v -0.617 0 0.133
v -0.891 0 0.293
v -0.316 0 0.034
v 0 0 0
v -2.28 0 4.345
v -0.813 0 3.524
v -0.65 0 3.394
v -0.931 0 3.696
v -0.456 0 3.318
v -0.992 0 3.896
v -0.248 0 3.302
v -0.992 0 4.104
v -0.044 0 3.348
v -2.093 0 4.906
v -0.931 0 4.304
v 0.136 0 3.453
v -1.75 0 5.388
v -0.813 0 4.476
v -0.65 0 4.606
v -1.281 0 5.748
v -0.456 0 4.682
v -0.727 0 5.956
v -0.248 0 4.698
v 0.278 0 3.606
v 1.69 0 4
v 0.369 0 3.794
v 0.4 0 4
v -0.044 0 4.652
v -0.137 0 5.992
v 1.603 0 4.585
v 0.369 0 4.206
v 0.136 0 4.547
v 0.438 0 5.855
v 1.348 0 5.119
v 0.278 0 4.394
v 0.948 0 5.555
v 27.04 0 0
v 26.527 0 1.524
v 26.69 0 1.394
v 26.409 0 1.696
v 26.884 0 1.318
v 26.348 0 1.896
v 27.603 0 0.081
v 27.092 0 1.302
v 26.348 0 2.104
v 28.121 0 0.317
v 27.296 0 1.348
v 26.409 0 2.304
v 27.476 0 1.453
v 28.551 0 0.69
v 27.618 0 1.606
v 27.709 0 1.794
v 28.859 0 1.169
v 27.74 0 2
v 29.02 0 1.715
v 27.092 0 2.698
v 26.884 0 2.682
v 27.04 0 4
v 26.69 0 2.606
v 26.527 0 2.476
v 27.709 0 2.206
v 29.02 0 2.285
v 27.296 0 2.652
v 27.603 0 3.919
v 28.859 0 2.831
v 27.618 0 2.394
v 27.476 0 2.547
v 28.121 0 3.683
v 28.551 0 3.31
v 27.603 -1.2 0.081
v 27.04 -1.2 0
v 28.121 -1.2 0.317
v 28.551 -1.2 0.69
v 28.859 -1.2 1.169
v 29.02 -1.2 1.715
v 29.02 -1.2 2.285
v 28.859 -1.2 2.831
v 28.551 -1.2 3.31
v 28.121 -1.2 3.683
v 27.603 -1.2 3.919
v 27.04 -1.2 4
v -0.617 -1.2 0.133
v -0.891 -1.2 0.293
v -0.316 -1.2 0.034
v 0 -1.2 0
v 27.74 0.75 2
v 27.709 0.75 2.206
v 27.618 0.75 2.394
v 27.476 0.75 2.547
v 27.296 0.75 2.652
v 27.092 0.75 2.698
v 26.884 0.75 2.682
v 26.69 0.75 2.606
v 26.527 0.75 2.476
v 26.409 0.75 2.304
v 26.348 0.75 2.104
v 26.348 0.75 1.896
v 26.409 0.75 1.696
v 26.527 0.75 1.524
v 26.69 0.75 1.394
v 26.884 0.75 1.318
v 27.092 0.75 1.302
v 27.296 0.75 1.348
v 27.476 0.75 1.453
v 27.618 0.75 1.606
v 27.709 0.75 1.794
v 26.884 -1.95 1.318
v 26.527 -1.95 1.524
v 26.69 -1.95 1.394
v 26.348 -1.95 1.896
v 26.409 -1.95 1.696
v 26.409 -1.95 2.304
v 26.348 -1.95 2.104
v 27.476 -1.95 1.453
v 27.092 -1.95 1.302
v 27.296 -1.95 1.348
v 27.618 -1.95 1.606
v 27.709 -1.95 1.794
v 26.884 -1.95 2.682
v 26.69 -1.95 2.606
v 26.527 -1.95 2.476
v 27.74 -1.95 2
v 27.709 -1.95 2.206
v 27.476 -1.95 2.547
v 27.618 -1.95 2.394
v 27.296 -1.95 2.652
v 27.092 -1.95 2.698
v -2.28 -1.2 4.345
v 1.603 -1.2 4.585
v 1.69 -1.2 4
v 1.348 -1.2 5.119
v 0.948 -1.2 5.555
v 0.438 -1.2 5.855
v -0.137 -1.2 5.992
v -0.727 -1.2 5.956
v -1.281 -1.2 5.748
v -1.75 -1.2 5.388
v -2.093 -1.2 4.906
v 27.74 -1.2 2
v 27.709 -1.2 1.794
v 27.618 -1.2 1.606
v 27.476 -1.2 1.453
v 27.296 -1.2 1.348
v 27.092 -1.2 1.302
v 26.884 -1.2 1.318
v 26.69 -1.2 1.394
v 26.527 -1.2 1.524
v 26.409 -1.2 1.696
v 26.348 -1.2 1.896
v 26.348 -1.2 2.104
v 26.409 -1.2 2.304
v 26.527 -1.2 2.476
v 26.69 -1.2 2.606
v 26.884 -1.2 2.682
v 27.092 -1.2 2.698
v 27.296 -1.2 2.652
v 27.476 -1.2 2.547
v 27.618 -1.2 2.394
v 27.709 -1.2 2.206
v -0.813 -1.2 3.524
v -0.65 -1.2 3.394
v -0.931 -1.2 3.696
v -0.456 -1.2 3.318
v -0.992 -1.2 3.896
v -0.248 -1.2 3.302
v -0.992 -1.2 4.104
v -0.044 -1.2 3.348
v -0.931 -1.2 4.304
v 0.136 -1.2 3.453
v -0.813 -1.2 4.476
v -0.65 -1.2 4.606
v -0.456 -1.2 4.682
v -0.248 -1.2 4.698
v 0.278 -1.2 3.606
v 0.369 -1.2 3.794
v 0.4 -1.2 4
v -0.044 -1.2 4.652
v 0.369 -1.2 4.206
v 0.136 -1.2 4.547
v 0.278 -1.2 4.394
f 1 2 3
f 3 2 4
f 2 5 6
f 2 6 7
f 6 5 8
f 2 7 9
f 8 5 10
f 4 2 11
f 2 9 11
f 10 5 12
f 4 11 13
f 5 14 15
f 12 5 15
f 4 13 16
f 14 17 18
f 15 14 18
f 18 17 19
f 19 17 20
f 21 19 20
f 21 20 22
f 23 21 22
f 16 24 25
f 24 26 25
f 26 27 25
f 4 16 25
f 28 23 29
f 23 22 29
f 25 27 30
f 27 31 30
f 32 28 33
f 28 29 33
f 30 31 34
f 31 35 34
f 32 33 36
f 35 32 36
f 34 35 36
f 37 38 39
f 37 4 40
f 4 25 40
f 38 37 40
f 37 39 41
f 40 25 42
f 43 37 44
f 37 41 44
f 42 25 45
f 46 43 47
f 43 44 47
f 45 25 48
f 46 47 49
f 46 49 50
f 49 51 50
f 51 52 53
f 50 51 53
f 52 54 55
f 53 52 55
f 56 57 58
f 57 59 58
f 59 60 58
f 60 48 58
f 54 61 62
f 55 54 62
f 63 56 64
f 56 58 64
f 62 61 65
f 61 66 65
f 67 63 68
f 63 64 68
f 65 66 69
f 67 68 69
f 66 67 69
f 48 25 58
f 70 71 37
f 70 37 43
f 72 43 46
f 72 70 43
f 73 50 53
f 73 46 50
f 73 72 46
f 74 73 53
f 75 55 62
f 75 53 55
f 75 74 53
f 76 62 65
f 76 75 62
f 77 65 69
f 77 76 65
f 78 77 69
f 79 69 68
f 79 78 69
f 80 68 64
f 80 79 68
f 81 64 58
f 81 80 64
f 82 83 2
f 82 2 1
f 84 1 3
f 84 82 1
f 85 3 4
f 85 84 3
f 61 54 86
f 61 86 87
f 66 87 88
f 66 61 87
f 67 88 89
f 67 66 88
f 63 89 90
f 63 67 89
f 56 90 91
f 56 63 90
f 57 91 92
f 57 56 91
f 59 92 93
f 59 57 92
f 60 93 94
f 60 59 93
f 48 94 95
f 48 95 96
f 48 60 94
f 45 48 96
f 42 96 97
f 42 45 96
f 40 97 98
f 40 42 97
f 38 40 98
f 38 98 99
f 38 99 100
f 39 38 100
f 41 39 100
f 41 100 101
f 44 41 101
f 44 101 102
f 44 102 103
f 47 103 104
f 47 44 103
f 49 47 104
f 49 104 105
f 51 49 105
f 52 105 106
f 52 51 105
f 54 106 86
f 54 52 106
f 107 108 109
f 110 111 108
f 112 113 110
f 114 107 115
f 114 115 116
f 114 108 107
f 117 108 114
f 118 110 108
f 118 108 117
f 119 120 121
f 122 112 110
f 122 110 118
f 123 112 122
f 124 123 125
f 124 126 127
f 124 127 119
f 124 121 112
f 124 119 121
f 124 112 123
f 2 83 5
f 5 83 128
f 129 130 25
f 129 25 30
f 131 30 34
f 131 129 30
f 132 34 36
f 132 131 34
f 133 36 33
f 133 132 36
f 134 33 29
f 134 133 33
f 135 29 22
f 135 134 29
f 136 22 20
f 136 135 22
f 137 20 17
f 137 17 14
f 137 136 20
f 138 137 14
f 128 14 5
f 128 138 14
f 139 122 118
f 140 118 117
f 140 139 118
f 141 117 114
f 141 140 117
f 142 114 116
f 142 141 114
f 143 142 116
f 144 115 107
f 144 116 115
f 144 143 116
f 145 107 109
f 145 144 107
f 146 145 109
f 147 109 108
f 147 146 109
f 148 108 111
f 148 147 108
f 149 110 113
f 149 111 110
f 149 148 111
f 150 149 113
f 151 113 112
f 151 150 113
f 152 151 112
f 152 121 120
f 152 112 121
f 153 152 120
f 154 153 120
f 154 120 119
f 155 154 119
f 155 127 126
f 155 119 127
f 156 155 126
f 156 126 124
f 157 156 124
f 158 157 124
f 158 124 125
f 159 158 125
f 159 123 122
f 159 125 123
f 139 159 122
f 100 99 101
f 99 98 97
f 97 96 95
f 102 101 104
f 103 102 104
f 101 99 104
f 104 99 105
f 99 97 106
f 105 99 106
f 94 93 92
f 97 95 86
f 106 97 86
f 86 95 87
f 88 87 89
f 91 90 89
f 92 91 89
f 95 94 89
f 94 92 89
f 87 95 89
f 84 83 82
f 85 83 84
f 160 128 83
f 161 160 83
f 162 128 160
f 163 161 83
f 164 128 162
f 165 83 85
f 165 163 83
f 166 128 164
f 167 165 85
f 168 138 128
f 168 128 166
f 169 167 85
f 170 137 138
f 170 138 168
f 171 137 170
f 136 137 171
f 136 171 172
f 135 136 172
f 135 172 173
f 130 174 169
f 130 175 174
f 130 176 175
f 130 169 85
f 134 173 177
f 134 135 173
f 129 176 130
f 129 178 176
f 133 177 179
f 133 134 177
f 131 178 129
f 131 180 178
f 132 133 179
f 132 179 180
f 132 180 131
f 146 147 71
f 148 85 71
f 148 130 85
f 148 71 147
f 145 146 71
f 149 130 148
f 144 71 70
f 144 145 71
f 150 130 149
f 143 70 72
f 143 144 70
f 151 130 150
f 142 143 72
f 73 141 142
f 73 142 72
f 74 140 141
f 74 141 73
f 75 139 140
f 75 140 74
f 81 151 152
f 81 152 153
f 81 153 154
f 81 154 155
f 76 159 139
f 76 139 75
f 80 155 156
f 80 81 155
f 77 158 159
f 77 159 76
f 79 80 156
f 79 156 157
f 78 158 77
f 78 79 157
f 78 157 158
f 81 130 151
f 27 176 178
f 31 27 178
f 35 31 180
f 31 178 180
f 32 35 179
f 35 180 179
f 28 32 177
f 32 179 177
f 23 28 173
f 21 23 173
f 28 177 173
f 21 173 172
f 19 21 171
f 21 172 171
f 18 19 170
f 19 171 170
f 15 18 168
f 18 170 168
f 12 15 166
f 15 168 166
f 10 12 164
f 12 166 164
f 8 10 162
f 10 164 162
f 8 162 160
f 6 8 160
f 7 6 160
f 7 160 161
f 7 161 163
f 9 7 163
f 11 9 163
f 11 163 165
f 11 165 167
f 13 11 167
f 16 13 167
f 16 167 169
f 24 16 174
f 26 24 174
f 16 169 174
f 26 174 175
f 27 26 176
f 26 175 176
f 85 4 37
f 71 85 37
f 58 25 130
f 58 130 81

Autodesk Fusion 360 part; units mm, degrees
sketch "Sketch1" plane through (0, 0, 0) normal (0, 0, 1) x (1, 0, 0)
  line L0 (0, 0) -> (27.04, 0)
  line L1 (27.04, 0) -> (27.04, -1.2)
  line L2 (27.04, -1.2) -> (0, -1.2)
  line L3 (0, -1.2) -> (0, 0)
  dimension "d1" = 27.04
  dimension "d2" = 1.2
extrude "Extrude1" add sketch "Sketch1" along normal blind 4
sketch "Sketch2" plane through (0, -1.2, 0) normal (0, -1, 0) x (1, 0, 0)
  line L0 (0, 0) -> (27.04, 0)
  line L1 (27.04, 0) -> (27.04, 4)
  line L2 (27.04, 4) -> (0, 4)
  line L3 (0, 4) -> (0, 0)
  circle A0 centre (27.04, 2) radius 2
  dimension "d5" = 4
extrude "Extrude2" add sketch "Sketch2" against normal blind 1.2 contours L1 A0 picked at (27.2278, 2.6397)
sketch "Sketch3" plane through (0, -1.2, 0) normal (0, -1, 0) x (1, 0, 0)
  line L0 (0, 0) -> (27.04, 0)
  arc A0 (27.04, 0) -> (27.04, 4) centre (27.04, 2) ccw
  line L1 (27.04, 4) -> (0, 4)
  line L2 (0, 4) -> (0, 0)
  circle A1 centre (27.04, 2) radius 0.7
  dimension "d8" = 1.4
extrude "Extrude3" cut sketch "Sketch3" against normal blind 10 contours A1
sketch "Sketch4" plane through (0, -1.2, 0) normal (0, -1, 0) x (1, 0, 0)
  circle A0 centre (27.04, 2) radius 0.7
  line L0 (0, 0) -> (27.04, 0)
  arc A1 (27.04, 0) -> (27.04, 4) centre (27.04, 2) ccw
  line L1 (27.04, 4) -> (0, 4)
  line L2 (0, 4) -> (0, 0)
  line L3 (0, 0) -> (0, 1.5)
  circle A2 centre (0, 1.5) radius 1.5
  line L4 (-1.0715, 0) -> (5.393, 0) construction
  line L5 (-0.8097, 0) -> (6.2004, 0) construction
  line L6 (25.3, 0) -> (25.3, 4)
  line L7 (25.3, 0) -> (29.5592, 0)
  line L8 (25.3, 4) -> (30.5, 4)
  line L9 (29.04, 0) -> (29.04, 4)
  line L10 (29.04, 4) -> (1.69, 4)
  line L11 (29.04, 4) -> (1.69, 4)
  line L12 (29.04, 4) -> (1.69, 4)
  line L13 (1.69, 4) -> (-0.31, 4)
  circle A3 centre (-0.31, 4) radius 2
  line L14 (1.69, 4) -> (-2.28, 4)
  line L15 (-2.28, 4) -> (-2.28, 4.3451)
  line L16 (1.69, 4) -> (-2.28, 4.3451)
  line L17 (-0.7906, 0) -> (-2.7155, 5.6156)
  line L18 (-0.7906, 0) -> (6.1719, 0) construction
  line L19 (-2.28, 4) -> (29.04, 4)
  dimension "d11" = 1.5
  dimension "d12" = 3
  dimension "d23" = 27.35
  dimension "d24" = 180
  dimension "d25" = 27.35
  dimension "d26" = 2
  dimension "d27" = 4
  dimension "d28" = 3.97
  dimension "d29" = 108.92
  dimension "d30" = 31.32
extrude "Extrude4" add sketch "Sketch4" against normal blind 1.2 contours L2 L3 A2 A3 L17 | L2 A2 A3 | A2 A3 L17 | A3 L16 | L1 L13 L14 L16 L17 L19 | L2 A2 L13 A3 L14 L17 L19 picked at (-0.163, 2.336)
sketch "Sketch5" plane through (0, -1.2, 0) normal (0, -1, 0) x (1, 0, 0)
  circle A0 centre (27.04, 2) radius 0.7
  line L0 (0, 0) -> (27.04, 0)
  arc A1 (27.04, 0) -> (27.04, 4) centre (27.04, 2) ccw
  line L1 (27.04, 4) -> (1.69, 4)
  arc A2 (1.69, 4) -> (-2.28, 4.3451) centre (-0.31, 4) ccw
  line L2 (-2.28, 4.3451) -> (-0.8912, 0.2935)
  arc A3 (-0.8912, 0.2935) -> (0, 0) centre (0, 1.5) ccw
  circle A4 centre (27.04, 2) radius 0.7
  dimension "d37" = 1.4
sketch "Sketch6" plane through (0, -1.2, 0) normal (0, -1, 0) x (1, 0, 0)
  circle A0 centre (-0.3, 4) radius 0.7
  dimension "d34" = 1.4
extrude "Extrude5" cut sketch "Sketch6" against normal blind 6.5
sketch "Sketch7" plane through (0, -1.2, 0) normal (0, -1, 0) x (1, 0, 0)
extrude "Extrude6" add sketch "Sketch5" against normal blind 1.95 contours A0 A4
extrude "Extrude7" add 1 faces at (26.8677, 0.75, 1.935) along direction (0, -1, 0) blind 2.7
